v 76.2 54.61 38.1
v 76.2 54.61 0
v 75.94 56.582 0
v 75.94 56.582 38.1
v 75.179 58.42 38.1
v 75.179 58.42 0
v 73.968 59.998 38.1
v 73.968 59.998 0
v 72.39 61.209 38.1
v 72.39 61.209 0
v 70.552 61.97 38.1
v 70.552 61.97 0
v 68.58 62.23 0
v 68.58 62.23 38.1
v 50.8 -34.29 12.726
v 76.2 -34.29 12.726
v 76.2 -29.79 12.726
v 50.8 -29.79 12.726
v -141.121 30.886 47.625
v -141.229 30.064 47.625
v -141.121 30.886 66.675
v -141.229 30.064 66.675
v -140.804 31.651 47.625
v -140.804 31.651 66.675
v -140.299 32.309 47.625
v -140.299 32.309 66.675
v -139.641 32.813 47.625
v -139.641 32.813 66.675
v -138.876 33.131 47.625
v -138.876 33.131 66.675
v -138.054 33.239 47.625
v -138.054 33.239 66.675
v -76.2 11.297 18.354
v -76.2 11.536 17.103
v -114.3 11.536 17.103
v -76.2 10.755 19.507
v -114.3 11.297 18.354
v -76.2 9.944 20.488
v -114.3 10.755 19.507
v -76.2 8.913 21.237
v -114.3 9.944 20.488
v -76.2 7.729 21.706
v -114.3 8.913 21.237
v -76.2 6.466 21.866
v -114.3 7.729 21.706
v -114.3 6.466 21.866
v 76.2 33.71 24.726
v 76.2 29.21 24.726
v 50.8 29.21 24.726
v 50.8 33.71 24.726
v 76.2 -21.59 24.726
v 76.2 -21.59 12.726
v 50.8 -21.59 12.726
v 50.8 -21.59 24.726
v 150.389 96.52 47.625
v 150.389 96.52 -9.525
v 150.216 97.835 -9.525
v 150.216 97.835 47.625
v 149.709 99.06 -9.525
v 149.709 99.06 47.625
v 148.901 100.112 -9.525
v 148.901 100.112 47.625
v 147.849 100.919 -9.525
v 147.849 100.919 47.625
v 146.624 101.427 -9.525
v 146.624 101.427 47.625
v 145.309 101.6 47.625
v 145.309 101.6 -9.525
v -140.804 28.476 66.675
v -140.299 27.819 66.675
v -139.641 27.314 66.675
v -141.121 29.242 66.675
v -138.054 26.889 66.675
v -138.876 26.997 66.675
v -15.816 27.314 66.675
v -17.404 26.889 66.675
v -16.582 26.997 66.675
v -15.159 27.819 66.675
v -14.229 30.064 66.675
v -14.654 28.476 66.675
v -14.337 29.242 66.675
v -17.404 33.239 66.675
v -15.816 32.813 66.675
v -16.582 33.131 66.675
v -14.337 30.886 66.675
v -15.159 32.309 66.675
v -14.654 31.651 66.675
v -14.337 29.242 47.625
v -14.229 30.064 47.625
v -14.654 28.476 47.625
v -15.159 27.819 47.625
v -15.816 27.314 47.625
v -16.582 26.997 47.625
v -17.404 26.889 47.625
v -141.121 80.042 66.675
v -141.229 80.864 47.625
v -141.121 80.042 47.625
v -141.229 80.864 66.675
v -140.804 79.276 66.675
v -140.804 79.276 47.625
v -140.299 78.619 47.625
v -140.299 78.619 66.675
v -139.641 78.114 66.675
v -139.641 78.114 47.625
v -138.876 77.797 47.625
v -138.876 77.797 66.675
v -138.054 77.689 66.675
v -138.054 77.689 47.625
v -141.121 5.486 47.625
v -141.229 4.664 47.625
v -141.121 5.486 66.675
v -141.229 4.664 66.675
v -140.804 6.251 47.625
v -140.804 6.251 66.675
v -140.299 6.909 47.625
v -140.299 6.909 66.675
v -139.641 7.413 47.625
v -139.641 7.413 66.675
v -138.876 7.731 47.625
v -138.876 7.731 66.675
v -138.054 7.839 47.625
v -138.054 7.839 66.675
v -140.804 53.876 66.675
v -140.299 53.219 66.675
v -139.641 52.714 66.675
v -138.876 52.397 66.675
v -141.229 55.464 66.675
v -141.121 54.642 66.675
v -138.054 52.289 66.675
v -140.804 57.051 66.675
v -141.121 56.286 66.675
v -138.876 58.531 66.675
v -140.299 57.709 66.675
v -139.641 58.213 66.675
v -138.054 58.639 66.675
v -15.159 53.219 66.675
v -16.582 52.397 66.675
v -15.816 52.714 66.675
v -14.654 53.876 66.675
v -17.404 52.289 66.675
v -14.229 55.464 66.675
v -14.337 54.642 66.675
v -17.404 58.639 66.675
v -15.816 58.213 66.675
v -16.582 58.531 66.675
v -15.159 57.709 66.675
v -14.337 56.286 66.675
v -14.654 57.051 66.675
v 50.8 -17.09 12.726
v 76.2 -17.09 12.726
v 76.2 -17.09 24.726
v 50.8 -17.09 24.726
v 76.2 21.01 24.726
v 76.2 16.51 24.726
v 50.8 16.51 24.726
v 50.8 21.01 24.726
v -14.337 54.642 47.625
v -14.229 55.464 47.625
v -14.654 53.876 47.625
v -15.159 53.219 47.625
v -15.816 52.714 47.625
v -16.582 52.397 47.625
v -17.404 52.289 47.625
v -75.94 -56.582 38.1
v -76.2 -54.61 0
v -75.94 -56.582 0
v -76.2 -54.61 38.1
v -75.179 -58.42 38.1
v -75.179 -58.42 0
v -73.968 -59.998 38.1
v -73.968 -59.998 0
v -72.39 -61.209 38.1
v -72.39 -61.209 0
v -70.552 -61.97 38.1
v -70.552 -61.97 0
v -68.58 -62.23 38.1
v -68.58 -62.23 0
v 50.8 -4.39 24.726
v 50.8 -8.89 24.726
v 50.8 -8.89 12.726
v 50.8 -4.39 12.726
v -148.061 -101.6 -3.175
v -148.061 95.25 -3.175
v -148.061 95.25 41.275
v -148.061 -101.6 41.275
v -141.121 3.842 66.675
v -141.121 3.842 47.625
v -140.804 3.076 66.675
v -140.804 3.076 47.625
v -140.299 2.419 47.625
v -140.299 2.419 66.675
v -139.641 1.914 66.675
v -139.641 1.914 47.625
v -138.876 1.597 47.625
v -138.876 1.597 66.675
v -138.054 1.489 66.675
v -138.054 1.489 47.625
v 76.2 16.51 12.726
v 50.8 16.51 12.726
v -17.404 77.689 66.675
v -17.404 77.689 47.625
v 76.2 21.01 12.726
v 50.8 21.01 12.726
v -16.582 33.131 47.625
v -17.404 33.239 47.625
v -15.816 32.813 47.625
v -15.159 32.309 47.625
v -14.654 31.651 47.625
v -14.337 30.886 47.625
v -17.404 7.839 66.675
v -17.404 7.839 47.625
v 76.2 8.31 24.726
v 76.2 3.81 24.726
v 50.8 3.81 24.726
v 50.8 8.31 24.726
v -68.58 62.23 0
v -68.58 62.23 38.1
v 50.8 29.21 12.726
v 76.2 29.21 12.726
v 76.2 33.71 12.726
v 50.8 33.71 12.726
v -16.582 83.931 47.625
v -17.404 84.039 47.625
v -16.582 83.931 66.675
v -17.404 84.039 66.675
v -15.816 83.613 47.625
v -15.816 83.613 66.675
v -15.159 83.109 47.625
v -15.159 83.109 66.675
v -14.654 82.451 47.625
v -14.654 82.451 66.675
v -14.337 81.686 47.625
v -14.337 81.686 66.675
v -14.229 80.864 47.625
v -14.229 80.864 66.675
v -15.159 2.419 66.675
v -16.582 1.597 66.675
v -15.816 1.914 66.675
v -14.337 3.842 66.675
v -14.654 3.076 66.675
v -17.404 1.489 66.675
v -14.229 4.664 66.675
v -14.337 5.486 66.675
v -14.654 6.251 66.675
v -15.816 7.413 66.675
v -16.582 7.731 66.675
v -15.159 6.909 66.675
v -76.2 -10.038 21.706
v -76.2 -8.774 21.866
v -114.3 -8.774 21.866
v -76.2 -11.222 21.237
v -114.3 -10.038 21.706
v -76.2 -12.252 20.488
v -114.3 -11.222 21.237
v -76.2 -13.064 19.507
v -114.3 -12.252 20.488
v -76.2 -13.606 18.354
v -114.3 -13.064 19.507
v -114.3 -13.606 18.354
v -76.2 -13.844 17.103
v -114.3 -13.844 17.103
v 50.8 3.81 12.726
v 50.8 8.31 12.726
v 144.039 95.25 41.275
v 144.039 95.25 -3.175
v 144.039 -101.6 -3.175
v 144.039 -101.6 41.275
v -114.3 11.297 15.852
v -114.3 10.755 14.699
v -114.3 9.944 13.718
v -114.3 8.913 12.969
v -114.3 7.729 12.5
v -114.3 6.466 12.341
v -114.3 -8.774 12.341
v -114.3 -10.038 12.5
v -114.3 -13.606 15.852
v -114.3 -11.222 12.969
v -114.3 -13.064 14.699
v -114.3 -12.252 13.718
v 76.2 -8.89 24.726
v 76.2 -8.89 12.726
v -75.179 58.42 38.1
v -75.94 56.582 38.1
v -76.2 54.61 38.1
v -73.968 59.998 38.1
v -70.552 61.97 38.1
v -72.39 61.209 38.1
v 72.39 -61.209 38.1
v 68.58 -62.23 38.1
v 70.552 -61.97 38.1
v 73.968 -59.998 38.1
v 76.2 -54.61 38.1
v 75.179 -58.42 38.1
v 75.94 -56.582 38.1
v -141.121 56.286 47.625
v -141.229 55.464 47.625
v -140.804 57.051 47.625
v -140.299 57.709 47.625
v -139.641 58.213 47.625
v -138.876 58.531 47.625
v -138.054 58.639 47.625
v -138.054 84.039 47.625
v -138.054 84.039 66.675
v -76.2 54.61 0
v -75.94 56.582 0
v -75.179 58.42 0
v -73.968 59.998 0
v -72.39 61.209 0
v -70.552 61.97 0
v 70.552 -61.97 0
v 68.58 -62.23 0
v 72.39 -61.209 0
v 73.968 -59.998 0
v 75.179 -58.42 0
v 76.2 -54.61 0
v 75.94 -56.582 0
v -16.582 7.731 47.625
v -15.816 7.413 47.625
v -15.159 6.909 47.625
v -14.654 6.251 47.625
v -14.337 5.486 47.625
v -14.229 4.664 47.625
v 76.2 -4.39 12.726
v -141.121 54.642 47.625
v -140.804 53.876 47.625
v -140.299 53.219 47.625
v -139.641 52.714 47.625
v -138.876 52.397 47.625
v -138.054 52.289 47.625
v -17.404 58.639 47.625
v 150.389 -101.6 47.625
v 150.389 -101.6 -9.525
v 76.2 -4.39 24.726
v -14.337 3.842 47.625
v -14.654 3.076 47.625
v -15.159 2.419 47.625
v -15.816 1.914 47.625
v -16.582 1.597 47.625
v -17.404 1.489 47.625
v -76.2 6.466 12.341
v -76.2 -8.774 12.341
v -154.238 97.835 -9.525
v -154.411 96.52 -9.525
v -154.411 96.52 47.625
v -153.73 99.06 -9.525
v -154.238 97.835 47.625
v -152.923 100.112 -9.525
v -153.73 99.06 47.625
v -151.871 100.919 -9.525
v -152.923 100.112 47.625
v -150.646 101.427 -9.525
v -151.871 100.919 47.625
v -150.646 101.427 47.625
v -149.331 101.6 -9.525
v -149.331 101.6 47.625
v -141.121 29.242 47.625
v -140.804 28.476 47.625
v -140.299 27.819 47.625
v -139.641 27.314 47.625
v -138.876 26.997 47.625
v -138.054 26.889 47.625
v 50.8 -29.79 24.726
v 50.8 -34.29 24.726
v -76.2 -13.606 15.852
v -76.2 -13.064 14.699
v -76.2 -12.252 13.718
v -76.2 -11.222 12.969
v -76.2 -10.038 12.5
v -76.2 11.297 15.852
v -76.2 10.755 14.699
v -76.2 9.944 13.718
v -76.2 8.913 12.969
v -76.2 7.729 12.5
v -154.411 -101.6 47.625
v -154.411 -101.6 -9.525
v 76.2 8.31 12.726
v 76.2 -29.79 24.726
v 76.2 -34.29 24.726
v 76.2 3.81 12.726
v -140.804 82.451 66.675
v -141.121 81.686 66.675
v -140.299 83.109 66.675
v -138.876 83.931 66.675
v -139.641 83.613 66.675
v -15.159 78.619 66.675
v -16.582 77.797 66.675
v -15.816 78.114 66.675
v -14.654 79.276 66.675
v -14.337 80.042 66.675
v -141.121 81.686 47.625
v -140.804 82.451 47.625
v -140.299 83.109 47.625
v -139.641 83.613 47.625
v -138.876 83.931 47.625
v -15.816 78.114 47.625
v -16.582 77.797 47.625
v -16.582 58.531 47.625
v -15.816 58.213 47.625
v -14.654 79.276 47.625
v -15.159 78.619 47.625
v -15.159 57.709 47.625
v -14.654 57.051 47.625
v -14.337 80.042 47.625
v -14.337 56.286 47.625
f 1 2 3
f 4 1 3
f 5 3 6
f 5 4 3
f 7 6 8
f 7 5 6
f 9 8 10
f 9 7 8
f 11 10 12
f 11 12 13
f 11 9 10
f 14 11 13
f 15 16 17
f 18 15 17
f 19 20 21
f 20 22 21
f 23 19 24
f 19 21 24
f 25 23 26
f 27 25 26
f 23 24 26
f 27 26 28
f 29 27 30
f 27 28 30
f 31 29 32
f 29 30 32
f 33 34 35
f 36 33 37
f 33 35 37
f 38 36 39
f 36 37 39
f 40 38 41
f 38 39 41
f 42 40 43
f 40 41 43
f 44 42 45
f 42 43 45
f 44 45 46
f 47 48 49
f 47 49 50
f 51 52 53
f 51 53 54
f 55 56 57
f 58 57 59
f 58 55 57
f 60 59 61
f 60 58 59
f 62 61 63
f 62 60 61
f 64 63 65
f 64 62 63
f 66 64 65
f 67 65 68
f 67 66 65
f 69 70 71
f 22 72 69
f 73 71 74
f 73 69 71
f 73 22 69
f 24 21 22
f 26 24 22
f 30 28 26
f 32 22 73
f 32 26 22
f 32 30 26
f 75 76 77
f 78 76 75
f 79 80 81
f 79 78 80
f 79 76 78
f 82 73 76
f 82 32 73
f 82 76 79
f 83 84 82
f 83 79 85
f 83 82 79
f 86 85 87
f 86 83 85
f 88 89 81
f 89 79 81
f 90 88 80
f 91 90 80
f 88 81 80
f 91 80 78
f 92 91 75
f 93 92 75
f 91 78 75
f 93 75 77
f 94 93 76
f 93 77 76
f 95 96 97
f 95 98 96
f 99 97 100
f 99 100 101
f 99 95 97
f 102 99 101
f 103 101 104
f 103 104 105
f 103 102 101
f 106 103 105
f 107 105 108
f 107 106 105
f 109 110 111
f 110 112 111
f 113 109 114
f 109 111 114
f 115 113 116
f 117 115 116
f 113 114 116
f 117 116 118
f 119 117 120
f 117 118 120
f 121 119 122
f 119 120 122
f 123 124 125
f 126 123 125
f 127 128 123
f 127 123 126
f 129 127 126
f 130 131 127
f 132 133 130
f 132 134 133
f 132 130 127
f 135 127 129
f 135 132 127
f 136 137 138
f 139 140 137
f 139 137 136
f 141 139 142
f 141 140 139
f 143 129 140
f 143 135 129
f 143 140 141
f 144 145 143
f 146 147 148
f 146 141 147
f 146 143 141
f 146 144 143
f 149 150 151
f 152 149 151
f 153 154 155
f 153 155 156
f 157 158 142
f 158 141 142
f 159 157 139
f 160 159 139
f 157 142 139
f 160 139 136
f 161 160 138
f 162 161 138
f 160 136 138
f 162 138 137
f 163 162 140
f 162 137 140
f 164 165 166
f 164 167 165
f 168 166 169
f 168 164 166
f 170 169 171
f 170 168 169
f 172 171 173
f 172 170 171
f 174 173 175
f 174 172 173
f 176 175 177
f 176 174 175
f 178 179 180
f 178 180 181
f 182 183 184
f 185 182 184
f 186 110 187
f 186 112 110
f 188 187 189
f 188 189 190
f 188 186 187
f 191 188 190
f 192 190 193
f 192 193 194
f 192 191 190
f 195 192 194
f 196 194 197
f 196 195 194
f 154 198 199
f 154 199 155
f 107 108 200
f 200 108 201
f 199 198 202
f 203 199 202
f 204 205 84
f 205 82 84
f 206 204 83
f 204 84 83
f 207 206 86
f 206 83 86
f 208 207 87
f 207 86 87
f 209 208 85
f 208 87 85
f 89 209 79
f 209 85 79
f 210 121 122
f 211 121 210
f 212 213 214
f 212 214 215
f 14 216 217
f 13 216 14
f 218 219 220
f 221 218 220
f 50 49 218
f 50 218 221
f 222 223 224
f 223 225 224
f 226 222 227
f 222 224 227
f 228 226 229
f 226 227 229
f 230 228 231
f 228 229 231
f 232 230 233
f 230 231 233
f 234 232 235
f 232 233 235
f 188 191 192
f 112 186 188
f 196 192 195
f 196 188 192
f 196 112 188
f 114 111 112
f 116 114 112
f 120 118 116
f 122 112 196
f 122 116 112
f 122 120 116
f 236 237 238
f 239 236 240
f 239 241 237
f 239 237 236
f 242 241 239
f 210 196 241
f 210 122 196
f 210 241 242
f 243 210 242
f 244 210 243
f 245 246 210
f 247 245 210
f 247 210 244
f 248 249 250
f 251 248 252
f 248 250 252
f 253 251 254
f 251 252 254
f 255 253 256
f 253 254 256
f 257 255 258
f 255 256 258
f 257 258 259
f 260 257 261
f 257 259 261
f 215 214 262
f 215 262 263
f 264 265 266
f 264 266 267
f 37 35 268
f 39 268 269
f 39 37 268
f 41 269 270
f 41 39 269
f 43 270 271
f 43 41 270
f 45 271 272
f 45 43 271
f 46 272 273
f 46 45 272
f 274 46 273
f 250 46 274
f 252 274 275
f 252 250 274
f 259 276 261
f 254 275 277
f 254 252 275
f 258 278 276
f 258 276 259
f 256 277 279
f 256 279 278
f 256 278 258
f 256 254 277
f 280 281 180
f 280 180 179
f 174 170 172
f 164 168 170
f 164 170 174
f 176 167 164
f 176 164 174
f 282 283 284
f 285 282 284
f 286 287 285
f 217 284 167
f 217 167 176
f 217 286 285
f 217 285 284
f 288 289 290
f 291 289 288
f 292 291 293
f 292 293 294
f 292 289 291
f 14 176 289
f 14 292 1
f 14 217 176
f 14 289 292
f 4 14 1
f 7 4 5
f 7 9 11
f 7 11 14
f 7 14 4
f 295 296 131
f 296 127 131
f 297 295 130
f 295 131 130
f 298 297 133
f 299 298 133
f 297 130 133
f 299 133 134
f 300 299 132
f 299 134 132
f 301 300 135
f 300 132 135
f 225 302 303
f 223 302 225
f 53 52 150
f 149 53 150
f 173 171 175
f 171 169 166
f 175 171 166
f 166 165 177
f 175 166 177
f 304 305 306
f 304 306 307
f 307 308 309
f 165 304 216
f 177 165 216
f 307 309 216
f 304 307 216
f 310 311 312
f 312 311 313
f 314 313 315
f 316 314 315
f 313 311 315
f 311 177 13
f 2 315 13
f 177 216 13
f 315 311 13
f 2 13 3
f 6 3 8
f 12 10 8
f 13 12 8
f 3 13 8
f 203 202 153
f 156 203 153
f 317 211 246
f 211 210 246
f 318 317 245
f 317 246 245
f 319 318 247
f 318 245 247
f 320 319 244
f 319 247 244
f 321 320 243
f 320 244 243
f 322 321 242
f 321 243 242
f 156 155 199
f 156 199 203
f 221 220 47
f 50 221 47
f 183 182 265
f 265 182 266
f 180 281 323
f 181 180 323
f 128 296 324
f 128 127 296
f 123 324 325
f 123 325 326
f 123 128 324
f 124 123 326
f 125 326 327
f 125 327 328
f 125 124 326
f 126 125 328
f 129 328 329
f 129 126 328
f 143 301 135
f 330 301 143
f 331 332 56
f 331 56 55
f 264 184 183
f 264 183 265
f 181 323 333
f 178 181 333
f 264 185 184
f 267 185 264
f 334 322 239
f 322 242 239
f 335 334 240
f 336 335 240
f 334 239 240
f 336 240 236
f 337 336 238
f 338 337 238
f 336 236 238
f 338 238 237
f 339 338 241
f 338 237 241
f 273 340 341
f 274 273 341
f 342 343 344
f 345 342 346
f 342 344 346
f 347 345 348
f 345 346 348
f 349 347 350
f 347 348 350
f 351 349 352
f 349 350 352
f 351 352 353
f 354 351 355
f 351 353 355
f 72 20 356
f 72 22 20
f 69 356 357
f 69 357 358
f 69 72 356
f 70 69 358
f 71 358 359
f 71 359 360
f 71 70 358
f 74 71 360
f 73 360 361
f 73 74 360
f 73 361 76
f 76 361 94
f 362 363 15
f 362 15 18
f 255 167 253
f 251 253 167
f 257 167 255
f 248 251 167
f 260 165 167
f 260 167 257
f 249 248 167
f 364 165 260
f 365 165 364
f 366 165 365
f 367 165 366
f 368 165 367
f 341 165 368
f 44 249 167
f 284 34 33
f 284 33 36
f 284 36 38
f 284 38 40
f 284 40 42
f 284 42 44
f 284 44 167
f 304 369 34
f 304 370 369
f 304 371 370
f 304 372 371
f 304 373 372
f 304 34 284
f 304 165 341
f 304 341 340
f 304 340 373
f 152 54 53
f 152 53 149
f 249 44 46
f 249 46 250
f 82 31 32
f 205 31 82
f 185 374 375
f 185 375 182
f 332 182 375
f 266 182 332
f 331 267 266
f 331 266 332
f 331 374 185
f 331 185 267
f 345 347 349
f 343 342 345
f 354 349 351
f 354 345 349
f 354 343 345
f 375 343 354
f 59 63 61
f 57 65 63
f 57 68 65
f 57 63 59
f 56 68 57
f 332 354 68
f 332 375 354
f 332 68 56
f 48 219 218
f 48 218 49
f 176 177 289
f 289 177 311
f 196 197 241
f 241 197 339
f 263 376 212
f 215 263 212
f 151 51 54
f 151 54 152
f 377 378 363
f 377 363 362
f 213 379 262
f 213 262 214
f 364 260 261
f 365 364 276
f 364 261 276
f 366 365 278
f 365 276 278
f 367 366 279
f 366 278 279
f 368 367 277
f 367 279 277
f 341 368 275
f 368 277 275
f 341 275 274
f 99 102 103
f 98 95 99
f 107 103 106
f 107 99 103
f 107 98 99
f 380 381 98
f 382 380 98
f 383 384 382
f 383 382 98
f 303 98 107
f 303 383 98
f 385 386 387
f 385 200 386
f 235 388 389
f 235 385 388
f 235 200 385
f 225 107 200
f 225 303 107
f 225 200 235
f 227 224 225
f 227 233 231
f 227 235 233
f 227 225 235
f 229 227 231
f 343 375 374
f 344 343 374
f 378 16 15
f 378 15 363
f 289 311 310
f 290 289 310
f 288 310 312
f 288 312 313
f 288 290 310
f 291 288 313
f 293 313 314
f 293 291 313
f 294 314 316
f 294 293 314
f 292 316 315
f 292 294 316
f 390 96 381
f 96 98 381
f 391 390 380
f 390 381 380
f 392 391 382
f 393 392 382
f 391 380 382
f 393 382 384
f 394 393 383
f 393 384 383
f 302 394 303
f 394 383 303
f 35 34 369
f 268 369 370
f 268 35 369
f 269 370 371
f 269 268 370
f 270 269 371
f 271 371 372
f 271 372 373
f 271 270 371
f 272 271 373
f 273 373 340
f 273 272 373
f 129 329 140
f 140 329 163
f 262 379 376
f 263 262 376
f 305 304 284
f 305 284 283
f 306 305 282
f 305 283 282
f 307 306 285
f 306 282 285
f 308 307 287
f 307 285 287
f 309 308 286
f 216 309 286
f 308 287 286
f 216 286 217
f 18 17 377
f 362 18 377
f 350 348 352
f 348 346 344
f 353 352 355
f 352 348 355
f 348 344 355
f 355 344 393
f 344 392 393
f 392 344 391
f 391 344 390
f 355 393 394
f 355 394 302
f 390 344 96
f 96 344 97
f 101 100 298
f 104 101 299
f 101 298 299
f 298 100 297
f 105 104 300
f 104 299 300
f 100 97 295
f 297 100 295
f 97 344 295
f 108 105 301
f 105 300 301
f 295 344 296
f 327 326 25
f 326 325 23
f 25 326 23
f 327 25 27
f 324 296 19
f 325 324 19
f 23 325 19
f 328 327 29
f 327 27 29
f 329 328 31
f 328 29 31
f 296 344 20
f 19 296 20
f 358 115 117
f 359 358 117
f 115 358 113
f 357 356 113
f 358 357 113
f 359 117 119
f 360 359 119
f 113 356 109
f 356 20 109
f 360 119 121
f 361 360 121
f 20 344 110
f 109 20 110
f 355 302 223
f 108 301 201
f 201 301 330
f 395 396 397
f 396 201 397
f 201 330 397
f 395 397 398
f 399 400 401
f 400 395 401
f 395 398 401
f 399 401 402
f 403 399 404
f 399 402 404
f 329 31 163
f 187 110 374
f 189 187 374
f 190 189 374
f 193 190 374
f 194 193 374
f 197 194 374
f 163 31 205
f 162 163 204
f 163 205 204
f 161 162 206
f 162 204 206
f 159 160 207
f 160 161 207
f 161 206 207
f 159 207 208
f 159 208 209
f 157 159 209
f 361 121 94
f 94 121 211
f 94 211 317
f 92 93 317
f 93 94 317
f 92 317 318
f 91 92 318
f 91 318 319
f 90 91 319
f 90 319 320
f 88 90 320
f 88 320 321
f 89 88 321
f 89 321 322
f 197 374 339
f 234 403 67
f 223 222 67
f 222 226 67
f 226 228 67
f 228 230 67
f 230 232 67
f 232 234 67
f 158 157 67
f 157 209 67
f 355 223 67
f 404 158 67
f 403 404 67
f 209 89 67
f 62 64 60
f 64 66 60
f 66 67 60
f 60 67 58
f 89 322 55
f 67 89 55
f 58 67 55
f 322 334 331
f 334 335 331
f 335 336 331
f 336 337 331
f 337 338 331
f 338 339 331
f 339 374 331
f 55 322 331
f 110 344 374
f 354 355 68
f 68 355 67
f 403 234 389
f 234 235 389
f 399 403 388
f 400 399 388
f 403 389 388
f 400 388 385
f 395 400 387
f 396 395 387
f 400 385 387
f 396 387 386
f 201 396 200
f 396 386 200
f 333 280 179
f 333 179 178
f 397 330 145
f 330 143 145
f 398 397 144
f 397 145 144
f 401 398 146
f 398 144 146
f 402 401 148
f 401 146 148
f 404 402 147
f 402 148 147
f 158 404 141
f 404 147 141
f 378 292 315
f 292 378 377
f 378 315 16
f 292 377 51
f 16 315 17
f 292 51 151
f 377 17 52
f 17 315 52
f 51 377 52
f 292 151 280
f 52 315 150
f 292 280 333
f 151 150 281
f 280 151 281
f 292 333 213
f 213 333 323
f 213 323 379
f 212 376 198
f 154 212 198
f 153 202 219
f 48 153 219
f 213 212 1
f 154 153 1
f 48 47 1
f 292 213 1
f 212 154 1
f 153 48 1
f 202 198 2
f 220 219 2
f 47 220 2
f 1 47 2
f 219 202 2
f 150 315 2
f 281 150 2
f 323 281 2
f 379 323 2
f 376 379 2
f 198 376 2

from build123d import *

# Parameters (mm, degrees)
F0_W        = 152.4
F0_H        = 124.46
F1_DEPTH    = 38.1
F2_R        = 7.62
F3_W        = 4.5
F3_H        = 12
F4_DEPTH    = 25.4
F5_W        = 25.4
F5_H        = 9.525
F6_DEPTH    = 38.1
F7_T1_DEPTH = 50.8
F8_W        = 304.8
F8_H        = 57.15
F9_DEPTH    = 101.6
F10_T       = -6.35
F11_R       = 5.08
F12_W       = 127
F12_H       = 6.35
F13_DEPTH   = 19.05
F14_R       = 3.17499


# Not quite as in the source:
# - a fillet or chamfer that OpenCascade refuses, or shapes differently, is made with other operations: its cross-section is extruded or revolved along the edge and cut away or added
# - a fillet or chamfer is up to 0.001 mm smaller than in the source, because OpenCascade refuses the exact size


with BuildPart() as f1:
    # F0 (on Top) → F1 (new body)
    with BuildSketch(Plane.XY):
        Rectangle(F0_W, F0_H)
    extrude(amount=F1_DEPTH)

    # F2
    f2_edges = [f1.edges().sort_by_distance(p)[0] for p in [
        (-76.2, -62.23, 19.05),
        (76.2, -62.23, 19.05),
        (76.2, 62.23, 19.05),
        (-76.2, 62.23, 19.05),
    ]]
    fillet(f2_edges, radius=F2_R)

    # F3 (on face) → F4 (cut)
    with BuildSketch(Plane.YZ.offset(76.2)):
        with Locations((-32.04, 18.7256509207)):
            Rectangle(F3_W, F3_H)
        with Locations((-19.34, 18.7256509207)):
            Rectangle(F3_W, F3_H)
        with Locations((-6.64, 18.7256509207)):
            Rectangle(F3_W, F3_H)
        with Locations((6.06, 18.7256509207)):
            Rectangle(F3_W, F3_H)
        with Locations((18.76, 18.7256509207)):
            Rectangle(F3_W, F3_H)
        with Locations((31.46, 18.7256509207)):
            Rectangle(F3_W, F3_H)
    extrude(amount=-F4_DEPTH, mode=Mode.SUBTRACT)

    # F5 (on face) → F6 (join)
    with BuildSketch(Plane(origin=(-76.2, 0, 0), x_dir=(0, -1, 0), z_dir=(-1, 0, 0))):
        with Locations((1.1544073932, 17.1030452147)):
            Rectangle(F5_W, F5_H)
    extrude(amount=F6_DEPTH)

    # F7: fillet of radius 5.08 on 4 edges, made by hand

    # F7_s2 → F7_t1 (cut)
    with BuildSketch(Plane.YZ.offset(-127)):
        with BuildLine():
            ThreePointArc((-8.7744073932, 21.8655452147), (-12.3665098416, 20.3776476631), (-13.8544073932, 16.7855452147))
            Line((-13.8544073932, 16.7855452147), (-13.8544073932, 21.8655452147))
            Line((-13.8544073932, 21.8655452147), (-8.7744073932, 21.8655452147))
        make_face()
        with BuildLine():
            ThreePointArc((-13.8544073932, 17.4205452147), (-12.3665098416, 13.8284427663), (-8.7744073932, 12.3405452147))
            Line((-8.7744073932, 12.3405452147), (-13.8544073932, 12.3405452147))
            Line((-13.8544073932, 12.3405452147), (-13.8544073932, 17.4205452147))
        make_face()
        with BuildLine():
            ThreePointArc((11.5455926068, 16.7855452147), (10.0576950552, 20.3776476631), (6.4655926068, 21.8655452147))
            Line((6.4655926068, 21.8655452147), (11.5455926068, 21.8655452147))
            Line((11.5455926068, 21.8655452147), (11.5455926068, 16.7855452147))
        make_face()
        with BuildLine():
            ThreePointArc((11.5455926068, 17.4205452147), (10.0576950552, 13.8284427663), (6.4655926068, 12.3405452147))
            Line((6.4655926068, 12.3405452147), (11.5455926068, 12.3405452147))
            Line((11.5455926068, 12.3405452147), (11.5455926068, 17.4205452147))
        make_face()
    extrude(amount=F7_T1_DEPTH, mode=Mode.SUBTRACT)


with BuildPart() as f9:
    # F8 (on Front) → F9 (new body, symmetric)
    with BuildSketch(Plane.XZ):
        with Locations((-2.0108222961, 19.05)):
            Rectangle(F8_W, F8_H)
    extrude(amount=F9_DEPTH, both=True)

    # F10
    f10_openings = [f9.faces().sort_by_distance(p)[0] for p in [
        (-2.010822, -101.6, 19.05),
    ]]
    offset(amount=F10_T, openings=f10_openings)

    # F11
    f11_edges = [f9.edges().sort_by_distance(p)[0] for p in [
        (-154.410822, 101.6, 19.05),
        (150.389178, 101.6, 19.05),
    ]]
    fillet(f11_edges, radius=F11_R)

    # F12 (on face) → F13 (join)
    with BuildSketch(Plane.XY.offset(47.625)):
        with Locations((-77.7289685793, 80.8637710965)):
            Rectangle(F12_W, F12_H)
        with Locations((-77.7289685793, 55.4637710965)):
            Rectangle(F12_W, F12_H)
        with Locations((-77.7289685793, 30.0637710965)):
            Rectangle(F12_W, F12_H)
        with Locations((-77.7289685793, 4.6637710965)):
            Rectangle(F12_W, F12_H)
    extrude(amount=F13_DEPTH)

    # F14 (radius 3.175 in the source; OpenCascade refuses exactly that, so slightly less here)
    f14_edges = [f9.edges().sort_by_distance(p)[0] for p in [
        (-141.228969, 84.038771, 57.15),
        (-141.228969, 77.688771, 57.15),
        (-141.228969, 58.638771, 57.15),
        (-141.228969, 33.238771, 57.15),
        (-141.228969, 7.838771, 57.15),
        (-141.228969, 1.488771, 57.15),
        (-14.228969, 77.688771, 57.15),
        (-14.228969, 84.038771, 57.15),
        (-14.228969, 58.638771, 57.15),
        (-14.228969, 52.288771, 57.15),
        (-14.228969, 33.238771, 57.15),
        (-14.228969, 26.888771, 57.15),
        (-14.228969, 7.838771, 57.15),
        (-14.228969, 1.488771, 57.15),
        (-141.228969, 52.288771, 57.15),
        (-141.228969, 26.888771, 57.15),
    ]]
    fillet(f14_edges, radius=F14_R)


solid = Compound([f1.part, f9.part])
